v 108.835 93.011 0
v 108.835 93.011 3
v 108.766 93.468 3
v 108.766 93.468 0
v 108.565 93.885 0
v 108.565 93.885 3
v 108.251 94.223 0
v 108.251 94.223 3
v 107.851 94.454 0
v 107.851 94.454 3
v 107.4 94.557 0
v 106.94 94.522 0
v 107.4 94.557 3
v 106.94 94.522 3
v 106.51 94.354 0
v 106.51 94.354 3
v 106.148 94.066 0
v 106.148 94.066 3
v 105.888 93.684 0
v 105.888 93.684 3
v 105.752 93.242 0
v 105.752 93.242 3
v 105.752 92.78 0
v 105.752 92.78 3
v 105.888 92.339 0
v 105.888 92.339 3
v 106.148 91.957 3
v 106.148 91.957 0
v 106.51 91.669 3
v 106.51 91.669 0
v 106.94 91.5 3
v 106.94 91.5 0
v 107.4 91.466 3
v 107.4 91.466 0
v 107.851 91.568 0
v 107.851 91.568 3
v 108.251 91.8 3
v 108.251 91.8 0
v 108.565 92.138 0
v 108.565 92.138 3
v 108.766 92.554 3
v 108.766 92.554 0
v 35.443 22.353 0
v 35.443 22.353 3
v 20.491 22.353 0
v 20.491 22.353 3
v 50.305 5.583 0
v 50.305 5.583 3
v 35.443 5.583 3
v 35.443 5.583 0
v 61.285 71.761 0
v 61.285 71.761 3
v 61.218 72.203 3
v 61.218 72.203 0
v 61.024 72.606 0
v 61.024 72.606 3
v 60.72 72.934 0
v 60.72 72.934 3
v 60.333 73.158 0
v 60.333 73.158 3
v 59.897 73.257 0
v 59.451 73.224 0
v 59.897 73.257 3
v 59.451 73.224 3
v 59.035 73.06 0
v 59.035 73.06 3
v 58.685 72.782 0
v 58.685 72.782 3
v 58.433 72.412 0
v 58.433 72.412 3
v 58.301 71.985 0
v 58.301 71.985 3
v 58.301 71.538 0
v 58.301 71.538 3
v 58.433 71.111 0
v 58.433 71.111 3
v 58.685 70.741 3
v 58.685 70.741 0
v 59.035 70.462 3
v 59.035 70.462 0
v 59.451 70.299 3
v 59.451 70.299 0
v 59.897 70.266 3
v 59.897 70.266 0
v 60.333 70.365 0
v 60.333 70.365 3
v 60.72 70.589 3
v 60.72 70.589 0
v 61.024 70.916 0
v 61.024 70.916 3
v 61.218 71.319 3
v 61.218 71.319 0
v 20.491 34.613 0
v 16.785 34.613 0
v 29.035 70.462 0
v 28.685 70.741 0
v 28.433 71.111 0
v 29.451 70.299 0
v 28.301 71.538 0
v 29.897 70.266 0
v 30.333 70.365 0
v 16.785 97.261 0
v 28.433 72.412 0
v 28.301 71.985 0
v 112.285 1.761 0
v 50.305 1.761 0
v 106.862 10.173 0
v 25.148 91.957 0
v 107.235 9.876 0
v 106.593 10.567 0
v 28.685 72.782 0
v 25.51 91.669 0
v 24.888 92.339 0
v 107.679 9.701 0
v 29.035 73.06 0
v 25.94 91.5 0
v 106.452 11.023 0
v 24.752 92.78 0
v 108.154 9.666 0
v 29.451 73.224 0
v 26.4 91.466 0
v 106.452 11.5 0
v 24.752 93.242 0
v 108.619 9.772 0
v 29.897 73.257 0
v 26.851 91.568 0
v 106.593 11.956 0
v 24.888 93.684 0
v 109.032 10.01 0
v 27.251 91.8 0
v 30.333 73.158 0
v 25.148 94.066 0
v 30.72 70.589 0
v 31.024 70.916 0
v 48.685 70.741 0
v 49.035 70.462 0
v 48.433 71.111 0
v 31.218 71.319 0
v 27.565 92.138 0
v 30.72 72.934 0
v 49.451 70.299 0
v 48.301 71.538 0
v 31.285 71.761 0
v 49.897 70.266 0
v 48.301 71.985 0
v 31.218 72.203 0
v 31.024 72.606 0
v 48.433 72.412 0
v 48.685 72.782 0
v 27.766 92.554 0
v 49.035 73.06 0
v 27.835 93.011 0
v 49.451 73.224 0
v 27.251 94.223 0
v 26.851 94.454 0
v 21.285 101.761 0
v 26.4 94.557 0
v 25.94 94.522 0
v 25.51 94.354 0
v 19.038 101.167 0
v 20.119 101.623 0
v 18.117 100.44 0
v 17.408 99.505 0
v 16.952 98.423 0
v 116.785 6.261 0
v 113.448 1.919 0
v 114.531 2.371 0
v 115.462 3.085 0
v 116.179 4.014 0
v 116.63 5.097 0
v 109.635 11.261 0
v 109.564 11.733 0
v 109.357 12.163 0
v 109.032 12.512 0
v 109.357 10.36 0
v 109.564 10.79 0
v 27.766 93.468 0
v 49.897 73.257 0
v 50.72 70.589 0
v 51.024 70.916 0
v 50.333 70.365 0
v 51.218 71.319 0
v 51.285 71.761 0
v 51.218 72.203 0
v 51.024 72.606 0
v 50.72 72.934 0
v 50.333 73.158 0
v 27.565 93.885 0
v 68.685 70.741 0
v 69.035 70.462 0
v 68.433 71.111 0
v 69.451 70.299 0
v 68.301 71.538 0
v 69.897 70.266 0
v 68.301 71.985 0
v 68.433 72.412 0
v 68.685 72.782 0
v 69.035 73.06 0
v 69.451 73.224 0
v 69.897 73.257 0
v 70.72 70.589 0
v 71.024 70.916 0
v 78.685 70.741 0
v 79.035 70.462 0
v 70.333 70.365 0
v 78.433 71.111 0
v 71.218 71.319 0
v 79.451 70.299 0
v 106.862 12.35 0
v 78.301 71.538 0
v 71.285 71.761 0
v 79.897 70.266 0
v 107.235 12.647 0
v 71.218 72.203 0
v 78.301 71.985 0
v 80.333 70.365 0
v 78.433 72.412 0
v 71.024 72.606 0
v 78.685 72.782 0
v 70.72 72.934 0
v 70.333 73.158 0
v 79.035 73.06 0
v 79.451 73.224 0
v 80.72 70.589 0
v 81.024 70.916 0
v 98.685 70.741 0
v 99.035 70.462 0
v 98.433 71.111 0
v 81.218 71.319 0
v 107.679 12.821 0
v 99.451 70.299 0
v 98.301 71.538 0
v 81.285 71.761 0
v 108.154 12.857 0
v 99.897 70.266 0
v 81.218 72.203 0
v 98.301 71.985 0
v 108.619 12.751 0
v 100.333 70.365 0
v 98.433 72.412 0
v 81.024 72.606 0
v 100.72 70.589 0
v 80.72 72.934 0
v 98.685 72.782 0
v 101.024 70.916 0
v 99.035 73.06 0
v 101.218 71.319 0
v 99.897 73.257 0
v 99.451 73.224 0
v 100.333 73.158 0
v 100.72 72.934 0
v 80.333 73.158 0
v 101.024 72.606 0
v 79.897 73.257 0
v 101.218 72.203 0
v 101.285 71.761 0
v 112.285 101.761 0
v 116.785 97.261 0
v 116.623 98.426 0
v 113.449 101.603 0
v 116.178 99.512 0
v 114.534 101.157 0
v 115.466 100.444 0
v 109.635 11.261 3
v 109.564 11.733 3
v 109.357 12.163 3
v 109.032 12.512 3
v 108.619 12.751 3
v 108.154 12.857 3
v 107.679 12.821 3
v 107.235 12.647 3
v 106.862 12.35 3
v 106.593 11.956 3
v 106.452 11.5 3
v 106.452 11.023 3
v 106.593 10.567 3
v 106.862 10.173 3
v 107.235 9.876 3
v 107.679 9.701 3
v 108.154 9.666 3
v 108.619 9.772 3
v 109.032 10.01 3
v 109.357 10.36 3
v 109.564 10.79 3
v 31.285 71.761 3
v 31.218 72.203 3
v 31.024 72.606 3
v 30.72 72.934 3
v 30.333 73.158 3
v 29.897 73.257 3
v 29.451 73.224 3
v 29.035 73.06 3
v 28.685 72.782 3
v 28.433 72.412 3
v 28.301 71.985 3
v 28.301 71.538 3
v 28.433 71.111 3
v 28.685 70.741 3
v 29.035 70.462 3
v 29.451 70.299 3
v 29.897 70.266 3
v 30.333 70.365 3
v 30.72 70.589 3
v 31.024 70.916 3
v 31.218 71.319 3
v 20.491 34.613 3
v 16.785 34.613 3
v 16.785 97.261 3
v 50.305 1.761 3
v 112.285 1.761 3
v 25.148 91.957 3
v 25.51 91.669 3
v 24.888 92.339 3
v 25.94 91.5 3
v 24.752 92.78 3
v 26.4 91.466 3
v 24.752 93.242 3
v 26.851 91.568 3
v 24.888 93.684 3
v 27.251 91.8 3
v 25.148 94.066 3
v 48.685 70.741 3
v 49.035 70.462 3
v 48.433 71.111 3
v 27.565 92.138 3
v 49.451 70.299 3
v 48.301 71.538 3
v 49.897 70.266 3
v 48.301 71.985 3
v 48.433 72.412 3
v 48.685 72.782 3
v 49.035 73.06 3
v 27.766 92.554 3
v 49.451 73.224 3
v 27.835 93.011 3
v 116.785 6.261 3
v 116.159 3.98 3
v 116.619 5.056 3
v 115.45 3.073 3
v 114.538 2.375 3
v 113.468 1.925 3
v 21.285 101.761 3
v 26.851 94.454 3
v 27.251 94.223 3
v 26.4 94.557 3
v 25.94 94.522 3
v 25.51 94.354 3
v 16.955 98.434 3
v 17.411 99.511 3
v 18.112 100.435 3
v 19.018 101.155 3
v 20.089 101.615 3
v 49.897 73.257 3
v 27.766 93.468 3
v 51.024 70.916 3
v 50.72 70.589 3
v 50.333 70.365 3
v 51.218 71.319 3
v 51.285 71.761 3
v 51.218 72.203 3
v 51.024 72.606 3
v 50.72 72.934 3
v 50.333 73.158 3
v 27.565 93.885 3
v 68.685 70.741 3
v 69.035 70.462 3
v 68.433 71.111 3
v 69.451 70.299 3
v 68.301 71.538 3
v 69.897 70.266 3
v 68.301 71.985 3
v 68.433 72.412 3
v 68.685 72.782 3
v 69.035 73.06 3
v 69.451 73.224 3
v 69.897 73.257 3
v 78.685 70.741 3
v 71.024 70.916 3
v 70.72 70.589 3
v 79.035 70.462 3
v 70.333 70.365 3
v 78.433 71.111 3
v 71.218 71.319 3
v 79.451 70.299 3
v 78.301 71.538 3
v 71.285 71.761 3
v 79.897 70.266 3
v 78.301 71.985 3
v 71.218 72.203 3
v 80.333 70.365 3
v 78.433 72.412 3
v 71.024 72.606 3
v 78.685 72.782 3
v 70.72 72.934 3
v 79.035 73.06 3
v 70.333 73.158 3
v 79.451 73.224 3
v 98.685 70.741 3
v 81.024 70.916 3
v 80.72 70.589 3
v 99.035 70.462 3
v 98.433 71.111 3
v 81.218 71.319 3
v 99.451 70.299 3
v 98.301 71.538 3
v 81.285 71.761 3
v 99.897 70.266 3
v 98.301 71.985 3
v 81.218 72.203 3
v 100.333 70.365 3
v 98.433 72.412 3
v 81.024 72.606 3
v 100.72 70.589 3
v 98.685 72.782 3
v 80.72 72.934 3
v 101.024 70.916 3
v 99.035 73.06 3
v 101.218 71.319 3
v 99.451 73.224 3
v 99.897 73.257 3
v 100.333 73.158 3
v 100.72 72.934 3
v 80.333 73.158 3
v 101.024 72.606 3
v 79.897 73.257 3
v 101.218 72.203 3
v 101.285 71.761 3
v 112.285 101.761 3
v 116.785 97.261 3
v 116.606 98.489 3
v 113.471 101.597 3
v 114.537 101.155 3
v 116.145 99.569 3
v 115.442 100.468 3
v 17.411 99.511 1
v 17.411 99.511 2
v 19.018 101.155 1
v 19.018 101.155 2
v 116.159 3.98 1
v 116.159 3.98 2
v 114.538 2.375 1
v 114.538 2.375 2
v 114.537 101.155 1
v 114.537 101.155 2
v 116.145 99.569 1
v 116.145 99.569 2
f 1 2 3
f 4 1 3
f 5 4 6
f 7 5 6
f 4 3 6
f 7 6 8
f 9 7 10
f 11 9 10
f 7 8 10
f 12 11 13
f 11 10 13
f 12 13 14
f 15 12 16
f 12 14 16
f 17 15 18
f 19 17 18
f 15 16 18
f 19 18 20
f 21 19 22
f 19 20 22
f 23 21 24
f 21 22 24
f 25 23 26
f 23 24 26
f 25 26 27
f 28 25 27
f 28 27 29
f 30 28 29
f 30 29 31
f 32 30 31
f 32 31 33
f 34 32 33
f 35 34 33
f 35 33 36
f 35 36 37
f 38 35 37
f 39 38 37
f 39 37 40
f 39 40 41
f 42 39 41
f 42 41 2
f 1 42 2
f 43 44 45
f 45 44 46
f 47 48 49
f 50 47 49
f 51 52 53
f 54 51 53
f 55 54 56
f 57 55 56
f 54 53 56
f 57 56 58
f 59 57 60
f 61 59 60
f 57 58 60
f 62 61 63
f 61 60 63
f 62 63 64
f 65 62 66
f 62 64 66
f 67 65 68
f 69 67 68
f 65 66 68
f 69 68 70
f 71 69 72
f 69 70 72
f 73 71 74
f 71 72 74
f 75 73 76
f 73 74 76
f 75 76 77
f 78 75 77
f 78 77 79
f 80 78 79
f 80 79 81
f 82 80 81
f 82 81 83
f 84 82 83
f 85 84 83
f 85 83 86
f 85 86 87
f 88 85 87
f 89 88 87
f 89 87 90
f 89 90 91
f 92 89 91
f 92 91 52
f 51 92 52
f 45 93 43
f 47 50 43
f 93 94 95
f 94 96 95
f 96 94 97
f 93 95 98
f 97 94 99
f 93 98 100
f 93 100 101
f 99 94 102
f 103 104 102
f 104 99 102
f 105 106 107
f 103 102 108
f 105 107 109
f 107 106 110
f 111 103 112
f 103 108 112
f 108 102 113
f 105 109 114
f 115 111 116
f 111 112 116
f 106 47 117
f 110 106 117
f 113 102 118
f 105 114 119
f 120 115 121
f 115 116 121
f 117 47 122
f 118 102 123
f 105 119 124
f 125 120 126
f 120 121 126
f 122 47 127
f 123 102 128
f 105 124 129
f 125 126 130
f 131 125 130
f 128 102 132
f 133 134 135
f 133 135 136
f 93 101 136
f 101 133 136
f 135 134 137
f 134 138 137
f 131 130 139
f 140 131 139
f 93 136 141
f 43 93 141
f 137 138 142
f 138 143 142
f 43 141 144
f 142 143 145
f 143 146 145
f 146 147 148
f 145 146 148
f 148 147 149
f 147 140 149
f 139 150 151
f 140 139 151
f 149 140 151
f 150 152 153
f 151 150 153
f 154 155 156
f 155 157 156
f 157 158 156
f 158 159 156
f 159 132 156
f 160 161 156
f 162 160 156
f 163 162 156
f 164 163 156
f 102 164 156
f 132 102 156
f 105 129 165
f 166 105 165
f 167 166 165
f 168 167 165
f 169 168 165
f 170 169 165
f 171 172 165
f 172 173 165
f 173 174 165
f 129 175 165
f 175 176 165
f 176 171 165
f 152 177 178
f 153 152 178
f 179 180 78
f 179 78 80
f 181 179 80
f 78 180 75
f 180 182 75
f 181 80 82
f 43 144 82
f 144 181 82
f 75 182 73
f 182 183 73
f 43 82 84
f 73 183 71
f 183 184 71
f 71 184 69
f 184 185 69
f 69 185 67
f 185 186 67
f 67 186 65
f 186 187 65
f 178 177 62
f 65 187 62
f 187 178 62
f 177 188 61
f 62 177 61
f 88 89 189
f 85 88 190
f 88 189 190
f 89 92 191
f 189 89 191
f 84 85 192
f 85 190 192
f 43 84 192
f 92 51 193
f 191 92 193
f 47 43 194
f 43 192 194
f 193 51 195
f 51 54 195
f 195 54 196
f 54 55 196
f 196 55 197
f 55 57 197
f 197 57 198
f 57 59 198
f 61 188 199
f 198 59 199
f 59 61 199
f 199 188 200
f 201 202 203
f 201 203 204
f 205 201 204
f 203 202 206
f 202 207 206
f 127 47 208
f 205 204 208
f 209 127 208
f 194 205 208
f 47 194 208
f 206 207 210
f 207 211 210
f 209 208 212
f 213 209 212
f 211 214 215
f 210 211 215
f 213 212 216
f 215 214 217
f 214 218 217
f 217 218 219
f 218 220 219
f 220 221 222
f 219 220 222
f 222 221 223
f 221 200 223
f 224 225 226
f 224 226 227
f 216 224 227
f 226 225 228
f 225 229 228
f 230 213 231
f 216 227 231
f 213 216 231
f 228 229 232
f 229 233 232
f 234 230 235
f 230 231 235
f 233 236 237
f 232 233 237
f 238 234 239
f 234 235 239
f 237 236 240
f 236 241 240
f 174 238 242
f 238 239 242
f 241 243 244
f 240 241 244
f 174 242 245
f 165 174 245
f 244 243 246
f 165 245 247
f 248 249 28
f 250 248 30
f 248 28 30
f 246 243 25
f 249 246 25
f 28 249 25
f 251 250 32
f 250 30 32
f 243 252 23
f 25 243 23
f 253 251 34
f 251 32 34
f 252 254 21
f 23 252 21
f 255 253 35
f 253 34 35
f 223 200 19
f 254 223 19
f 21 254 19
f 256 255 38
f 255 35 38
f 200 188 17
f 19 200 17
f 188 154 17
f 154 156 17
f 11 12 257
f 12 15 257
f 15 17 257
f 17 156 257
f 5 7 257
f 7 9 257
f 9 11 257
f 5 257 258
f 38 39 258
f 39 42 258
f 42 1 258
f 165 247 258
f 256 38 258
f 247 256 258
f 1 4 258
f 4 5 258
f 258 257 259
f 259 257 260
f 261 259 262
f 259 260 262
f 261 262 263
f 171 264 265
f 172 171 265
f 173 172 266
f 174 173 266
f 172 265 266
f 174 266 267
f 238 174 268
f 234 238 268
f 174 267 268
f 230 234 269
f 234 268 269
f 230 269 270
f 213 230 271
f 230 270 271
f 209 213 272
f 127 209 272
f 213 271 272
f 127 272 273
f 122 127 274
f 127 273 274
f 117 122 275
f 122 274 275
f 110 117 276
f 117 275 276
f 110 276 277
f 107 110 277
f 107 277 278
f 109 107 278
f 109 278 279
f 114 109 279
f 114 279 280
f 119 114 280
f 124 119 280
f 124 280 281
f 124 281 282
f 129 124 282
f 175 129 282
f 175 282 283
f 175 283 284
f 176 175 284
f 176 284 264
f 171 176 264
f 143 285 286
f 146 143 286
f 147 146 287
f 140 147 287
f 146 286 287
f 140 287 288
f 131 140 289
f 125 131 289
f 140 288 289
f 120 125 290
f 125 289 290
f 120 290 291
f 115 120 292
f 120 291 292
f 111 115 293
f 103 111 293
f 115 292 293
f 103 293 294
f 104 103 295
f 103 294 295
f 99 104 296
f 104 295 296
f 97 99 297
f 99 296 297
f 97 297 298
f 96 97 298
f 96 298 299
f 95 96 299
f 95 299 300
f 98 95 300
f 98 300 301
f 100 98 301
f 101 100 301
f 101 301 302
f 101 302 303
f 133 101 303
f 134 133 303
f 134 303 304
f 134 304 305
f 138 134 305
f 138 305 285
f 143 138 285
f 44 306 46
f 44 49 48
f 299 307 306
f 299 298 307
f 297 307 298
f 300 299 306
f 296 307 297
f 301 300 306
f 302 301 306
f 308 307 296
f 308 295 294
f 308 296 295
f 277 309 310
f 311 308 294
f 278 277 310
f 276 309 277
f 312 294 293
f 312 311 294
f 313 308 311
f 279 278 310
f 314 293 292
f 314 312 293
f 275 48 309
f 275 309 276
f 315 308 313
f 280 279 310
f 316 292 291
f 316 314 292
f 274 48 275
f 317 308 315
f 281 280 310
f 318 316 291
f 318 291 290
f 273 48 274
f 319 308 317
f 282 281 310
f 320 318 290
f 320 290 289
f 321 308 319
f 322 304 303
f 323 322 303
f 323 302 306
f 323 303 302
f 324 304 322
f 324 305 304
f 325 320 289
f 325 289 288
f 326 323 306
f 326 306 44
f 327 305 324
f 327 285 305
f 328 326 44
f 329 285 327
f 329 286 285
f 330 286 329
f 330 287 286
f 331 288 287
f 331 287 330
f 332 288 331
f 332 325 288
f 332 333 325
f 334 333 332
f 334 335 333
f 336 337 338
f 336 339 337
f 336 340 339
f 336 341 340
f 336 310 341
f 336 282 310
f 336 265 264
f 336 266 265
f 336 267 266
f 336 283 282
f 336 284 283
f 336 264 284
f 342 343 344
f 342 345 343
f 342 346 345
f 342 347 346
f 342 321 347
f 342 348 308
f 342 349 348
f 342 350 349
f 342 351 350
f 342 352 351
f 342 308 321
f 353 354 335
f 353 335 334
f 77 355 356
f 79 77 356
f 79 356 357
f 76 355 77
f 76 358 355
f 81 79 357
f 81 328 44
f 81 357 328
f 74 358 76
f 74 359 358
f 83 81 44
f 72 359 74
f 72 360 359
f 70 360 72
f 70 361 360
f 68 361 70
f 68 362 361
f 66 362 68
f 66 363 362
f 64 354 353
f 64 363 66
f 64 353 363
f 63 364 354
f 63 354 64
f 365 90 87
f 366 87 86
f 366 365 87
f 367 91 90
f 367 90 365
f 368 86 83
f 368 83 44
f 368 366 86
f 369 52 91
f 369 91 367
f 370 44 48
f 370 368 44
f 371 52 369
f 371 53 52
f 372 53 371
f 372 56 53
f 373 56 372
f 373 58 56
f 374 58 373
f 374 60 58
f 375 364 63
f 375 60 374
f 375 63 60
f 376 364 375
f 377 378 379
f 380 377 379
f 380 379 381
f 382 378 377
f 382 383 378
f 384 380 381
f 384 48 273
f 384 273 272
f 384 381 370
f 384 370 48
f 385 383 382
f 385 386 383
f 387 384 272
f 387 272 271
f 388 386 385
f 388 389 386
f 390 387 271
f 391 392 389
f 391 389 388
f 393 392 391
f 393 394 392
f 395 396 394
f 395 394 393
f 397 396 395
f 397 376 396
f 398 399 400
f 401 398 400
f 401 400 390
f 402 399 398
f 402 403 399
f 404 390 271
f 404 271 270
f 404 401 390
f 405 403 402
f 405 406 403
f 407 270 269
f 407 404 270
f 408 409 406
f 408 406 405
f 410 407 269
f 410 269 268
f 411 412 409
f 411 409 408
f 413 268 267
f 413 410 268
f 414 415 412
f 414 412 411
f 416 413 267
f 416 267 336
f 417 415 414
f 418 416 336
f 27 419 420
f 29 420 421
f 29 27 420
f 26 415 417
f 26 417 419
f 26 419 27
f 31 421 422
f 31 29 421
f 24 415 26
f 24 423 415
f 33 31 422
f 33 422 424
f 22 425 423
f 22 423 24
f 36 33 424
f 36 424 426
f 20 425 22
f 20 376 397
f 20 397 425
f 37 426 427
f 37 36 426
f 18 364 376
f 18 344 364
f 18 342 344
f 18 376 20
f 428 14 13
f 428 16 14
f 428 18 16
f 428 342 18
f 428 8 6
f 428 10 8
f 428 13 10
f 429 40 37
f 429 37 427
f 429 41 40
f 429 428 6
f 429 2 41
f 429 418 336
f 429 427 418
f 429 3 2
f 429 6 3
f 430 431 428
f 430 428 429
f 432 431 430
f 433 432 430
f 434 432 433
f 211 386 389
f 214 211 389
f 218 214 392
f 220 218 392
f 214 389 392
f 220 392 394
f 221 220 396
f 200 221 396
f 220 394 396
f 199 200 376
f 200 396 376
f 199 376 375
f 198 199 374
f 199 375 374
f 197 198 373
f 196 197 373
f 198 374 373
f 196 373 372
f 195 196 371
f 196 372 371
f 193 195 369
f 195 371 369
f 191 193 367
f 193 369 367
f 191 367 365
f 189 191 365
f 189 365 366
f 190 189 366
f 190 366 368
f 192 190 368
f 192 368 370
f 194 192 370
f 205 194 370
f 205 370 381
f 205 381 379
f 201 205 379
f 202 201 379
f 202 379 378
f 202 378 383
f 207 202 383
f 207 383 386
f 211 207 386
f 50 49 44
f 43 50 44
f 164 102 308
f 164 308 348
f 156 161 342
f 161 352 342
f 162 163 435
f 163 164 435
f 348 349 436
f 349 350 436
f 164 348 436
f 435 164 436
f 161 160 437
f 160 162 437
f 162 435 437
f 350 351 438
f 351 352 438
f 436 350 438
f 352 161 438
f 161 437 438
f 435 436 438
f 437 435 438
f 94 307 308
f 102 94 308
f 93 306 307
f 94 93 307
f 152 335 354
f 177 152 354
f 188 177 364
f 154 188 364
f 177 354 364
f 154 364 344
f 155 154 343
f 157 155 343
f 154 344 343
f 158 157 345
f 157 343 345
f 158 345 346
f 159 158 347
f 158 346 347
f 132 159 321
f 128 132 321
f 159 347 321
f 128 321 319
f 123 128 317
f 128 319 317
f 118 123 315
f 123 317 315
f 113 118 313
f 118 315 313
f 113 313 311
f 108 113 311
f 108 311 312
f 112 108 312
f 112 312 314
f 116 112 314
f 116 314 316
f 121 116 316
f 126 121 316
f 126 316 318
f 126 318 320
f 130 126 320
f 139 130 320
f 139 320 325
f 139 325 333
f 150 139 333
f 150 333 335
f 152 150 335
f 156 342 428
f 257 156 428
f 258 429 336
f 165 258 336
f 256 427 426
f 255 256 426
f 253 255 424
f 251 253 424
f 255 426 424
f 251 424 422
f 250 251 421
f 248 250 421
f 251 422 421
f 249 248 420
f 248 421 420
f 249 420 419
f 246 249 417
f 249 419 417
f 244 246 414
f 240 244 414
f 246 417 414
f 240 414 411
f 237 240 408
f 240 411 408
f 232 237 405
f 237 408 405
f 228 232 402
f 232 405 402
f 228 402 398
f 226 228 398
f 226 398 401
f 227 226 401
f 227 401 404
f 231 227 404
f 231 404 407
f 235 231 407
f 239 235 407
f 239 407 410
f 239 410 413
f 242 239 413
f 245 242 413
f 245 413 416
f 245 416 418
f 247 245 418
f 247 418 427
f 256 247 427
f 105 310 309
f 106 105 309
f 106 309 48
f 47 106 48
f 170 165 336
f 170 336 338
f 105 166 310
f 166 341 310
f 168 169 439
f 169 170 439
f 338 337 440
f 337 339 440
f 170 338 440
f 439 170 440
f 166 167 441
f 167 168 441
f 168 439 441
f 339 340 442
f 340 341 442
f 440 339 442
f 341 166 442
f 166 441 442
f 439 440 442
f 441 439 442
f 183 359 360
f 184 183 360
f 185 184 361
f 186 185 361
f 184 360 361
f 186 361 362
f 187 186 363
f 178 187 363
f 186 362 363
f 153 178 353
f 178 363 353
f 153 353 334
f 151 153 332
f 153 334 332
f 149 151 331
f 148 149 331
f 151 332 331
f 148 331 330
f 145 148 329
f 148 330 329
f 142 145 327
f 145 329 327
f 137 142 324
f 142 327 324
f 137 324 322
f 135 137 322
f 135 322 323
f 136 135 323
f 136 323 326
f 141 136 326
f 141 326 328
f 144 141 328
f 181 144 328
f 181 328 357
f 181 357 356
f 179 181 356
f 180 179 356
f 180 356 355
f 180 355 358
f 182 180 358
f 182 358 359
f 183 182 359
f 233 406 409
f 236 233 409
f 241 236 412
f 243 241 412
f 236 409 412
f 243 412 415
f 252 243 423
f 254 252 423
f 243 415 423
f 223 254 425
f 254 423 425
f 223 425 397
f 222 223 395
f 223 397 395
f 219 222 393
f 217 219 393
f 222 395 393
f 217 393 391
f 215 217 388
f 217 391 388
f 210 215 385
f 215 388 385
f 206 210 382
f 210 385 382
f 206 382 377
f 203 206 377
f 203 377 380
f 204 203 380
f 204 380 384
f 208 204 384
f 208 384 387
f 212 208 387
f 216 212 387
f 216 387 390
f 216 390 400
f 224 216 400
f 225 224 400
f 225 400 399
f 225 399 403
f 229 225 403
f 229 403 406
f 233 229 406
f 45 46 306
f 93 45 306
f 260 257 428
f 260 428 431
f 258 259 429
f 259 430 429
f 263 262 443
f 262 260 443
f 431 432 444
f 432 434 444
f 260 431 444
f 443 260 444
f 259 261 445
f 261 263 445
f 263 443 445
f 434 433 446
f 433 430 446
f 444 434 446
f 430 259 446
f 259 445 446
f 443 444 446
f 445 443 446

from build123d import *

# Parameters (mm, degrees)
SKETCH1_W           = 127.279746886
SKETCH1_H           = 103.580209895
BOSS_EXTRUDE1_DEPTH = 3
SKETCH4_W           = 136.608236075
SKETCH4_H           = 109.831739099
CUT_EXTRUDE2_DEPTH  = 10
SKETCH5_R           = 1.55
SKETCH5_R_2         = 1.6
CUT_EXTRUDE3_DEPTH  = 10
SKETCH6_R           = 1.5
CUT_EXTRUDE4_DEPTH  = 10


with BuildPart() as part:
    # Sketch1 → Boss-Extrude1 (new body)
    with BuildSketch(Plane.XY):
        with Locations((63.639873443, 51.790104948)):
            Rectangle(SKETCH1_W, SKETCH1_H)
    extrude(amount=BOSS_EXTRUDE1_DEPTH)

    # Sketch4 → Cut-Extrude2 (cut)
    with BuildSketch(Plane.XY.offset(3)):
        with Locations((62.542352249, 51.998881619)):
            Rectangle(SKETCH4_W, SKETCH4_H)
        with BuildLine():
            Line((16.784625535, 34.613434216), (16.784625535, 97.261353998))
            add(Edge.make_bspline(
                [(16.784625535, 97.261353998), (16.814535165, 99.668332355), (18.795239635, 101.818752837), (21.284625535, 101.761353998)],
                knots=[0, 0, 0, 0, 1, 1, 1, 1], degree=3))
            Line((21.284625535, 101.761353998), (112.284625535, 101.761353998))
            add(Edge.make_bspline(
                [(112.284625535, 101.761353998), (114.750732895, 101.731954246), (116.737279379, 99.843042628), (116.784625535, 97.261353998)],
                knots=[0, 0, 0, 0, 1, 1, 1, 1], degree=3))
            Line((116.784625535, 97.261353998), (116.784625535, 6.261353998))
            add(Edge.make_bspline(
                [(116.784625535, 6.261353998), (116.776314504, 3.746141668), (114.734063303, 1.774849688), (112.284625535, 1.761353998)],
                knots=[0, 0, 0, 0, 1, 1, 1, 1], degree=3))
            Line((112.284625535, 1.761353998), (50.304591007, 1.761353998))
            Line((50.304591007, 1.761353998), (50.304591007, 5.583127479))
            Line((50.304591007, 5.583127479), (35.442949081, 5.583127479))
            Line((35.442949081, 5.583127479), (35.442949081, 22.35270073))
            Line((35.442949081, 22.35270073), (20.490844042, 22.35270073))
            Line((20.490844042, 22.35270073), (20.490844042, 34.613434216))
            Line((20.490844042, 34.613434216), (16.784625535, 34.613434216))
        make_face(mode=Mode.SUBTRACT)
    extrude(amount=-CUT_EXTRUDE2_DEPTH, mode=Mode.SUBTRACT)

    # Sketch5 → Cut-Extrude3 (cut)
    with BuildSketch(Plane.XY.offset(3)):
        with Locations((26.284625535, 93.011353998)):
            Circle(SKETCH5_R)
        with Locations((107.284625535, 93.011353998)):
            Circle(SKETCH5_R)
        with Locations((108.034625535, 11.261353998)):
            Circle(SKETCH5_R_2)
    extrude(amount=-CUT_EXTRUDE3_DEPTH, mode=Mode.SUBTRACT)

    # Sketch6 → Cut-Extrude4 (cut)
    with BuildSketch(Plane.XY.offset(3)):
        with Locations((29.784625535, 71.761353998)):
            Circle(SKETCH6_R)
        with Locations((49.784625535, 71.761353998)):
            Circle(SKETCH6_R)
        with Locations((59.784625535, 71.761353998)):
            Circle(SKETCH6_R)
        with Locations((69.784625535, 71.761353998)):
            Circle(SKETCH6_R)
        with Locations((79.784625535, 71.761353998)):
            Circle(SKETCH6_R)
        with Locations((99.784625535, 71.761353998)):
            Circle(SKETCH6_R)
    extrude(amount=-CUT_EXTRUDE4_DEPTH, mode=Mode.SUBTRACT)


solid = part.part
